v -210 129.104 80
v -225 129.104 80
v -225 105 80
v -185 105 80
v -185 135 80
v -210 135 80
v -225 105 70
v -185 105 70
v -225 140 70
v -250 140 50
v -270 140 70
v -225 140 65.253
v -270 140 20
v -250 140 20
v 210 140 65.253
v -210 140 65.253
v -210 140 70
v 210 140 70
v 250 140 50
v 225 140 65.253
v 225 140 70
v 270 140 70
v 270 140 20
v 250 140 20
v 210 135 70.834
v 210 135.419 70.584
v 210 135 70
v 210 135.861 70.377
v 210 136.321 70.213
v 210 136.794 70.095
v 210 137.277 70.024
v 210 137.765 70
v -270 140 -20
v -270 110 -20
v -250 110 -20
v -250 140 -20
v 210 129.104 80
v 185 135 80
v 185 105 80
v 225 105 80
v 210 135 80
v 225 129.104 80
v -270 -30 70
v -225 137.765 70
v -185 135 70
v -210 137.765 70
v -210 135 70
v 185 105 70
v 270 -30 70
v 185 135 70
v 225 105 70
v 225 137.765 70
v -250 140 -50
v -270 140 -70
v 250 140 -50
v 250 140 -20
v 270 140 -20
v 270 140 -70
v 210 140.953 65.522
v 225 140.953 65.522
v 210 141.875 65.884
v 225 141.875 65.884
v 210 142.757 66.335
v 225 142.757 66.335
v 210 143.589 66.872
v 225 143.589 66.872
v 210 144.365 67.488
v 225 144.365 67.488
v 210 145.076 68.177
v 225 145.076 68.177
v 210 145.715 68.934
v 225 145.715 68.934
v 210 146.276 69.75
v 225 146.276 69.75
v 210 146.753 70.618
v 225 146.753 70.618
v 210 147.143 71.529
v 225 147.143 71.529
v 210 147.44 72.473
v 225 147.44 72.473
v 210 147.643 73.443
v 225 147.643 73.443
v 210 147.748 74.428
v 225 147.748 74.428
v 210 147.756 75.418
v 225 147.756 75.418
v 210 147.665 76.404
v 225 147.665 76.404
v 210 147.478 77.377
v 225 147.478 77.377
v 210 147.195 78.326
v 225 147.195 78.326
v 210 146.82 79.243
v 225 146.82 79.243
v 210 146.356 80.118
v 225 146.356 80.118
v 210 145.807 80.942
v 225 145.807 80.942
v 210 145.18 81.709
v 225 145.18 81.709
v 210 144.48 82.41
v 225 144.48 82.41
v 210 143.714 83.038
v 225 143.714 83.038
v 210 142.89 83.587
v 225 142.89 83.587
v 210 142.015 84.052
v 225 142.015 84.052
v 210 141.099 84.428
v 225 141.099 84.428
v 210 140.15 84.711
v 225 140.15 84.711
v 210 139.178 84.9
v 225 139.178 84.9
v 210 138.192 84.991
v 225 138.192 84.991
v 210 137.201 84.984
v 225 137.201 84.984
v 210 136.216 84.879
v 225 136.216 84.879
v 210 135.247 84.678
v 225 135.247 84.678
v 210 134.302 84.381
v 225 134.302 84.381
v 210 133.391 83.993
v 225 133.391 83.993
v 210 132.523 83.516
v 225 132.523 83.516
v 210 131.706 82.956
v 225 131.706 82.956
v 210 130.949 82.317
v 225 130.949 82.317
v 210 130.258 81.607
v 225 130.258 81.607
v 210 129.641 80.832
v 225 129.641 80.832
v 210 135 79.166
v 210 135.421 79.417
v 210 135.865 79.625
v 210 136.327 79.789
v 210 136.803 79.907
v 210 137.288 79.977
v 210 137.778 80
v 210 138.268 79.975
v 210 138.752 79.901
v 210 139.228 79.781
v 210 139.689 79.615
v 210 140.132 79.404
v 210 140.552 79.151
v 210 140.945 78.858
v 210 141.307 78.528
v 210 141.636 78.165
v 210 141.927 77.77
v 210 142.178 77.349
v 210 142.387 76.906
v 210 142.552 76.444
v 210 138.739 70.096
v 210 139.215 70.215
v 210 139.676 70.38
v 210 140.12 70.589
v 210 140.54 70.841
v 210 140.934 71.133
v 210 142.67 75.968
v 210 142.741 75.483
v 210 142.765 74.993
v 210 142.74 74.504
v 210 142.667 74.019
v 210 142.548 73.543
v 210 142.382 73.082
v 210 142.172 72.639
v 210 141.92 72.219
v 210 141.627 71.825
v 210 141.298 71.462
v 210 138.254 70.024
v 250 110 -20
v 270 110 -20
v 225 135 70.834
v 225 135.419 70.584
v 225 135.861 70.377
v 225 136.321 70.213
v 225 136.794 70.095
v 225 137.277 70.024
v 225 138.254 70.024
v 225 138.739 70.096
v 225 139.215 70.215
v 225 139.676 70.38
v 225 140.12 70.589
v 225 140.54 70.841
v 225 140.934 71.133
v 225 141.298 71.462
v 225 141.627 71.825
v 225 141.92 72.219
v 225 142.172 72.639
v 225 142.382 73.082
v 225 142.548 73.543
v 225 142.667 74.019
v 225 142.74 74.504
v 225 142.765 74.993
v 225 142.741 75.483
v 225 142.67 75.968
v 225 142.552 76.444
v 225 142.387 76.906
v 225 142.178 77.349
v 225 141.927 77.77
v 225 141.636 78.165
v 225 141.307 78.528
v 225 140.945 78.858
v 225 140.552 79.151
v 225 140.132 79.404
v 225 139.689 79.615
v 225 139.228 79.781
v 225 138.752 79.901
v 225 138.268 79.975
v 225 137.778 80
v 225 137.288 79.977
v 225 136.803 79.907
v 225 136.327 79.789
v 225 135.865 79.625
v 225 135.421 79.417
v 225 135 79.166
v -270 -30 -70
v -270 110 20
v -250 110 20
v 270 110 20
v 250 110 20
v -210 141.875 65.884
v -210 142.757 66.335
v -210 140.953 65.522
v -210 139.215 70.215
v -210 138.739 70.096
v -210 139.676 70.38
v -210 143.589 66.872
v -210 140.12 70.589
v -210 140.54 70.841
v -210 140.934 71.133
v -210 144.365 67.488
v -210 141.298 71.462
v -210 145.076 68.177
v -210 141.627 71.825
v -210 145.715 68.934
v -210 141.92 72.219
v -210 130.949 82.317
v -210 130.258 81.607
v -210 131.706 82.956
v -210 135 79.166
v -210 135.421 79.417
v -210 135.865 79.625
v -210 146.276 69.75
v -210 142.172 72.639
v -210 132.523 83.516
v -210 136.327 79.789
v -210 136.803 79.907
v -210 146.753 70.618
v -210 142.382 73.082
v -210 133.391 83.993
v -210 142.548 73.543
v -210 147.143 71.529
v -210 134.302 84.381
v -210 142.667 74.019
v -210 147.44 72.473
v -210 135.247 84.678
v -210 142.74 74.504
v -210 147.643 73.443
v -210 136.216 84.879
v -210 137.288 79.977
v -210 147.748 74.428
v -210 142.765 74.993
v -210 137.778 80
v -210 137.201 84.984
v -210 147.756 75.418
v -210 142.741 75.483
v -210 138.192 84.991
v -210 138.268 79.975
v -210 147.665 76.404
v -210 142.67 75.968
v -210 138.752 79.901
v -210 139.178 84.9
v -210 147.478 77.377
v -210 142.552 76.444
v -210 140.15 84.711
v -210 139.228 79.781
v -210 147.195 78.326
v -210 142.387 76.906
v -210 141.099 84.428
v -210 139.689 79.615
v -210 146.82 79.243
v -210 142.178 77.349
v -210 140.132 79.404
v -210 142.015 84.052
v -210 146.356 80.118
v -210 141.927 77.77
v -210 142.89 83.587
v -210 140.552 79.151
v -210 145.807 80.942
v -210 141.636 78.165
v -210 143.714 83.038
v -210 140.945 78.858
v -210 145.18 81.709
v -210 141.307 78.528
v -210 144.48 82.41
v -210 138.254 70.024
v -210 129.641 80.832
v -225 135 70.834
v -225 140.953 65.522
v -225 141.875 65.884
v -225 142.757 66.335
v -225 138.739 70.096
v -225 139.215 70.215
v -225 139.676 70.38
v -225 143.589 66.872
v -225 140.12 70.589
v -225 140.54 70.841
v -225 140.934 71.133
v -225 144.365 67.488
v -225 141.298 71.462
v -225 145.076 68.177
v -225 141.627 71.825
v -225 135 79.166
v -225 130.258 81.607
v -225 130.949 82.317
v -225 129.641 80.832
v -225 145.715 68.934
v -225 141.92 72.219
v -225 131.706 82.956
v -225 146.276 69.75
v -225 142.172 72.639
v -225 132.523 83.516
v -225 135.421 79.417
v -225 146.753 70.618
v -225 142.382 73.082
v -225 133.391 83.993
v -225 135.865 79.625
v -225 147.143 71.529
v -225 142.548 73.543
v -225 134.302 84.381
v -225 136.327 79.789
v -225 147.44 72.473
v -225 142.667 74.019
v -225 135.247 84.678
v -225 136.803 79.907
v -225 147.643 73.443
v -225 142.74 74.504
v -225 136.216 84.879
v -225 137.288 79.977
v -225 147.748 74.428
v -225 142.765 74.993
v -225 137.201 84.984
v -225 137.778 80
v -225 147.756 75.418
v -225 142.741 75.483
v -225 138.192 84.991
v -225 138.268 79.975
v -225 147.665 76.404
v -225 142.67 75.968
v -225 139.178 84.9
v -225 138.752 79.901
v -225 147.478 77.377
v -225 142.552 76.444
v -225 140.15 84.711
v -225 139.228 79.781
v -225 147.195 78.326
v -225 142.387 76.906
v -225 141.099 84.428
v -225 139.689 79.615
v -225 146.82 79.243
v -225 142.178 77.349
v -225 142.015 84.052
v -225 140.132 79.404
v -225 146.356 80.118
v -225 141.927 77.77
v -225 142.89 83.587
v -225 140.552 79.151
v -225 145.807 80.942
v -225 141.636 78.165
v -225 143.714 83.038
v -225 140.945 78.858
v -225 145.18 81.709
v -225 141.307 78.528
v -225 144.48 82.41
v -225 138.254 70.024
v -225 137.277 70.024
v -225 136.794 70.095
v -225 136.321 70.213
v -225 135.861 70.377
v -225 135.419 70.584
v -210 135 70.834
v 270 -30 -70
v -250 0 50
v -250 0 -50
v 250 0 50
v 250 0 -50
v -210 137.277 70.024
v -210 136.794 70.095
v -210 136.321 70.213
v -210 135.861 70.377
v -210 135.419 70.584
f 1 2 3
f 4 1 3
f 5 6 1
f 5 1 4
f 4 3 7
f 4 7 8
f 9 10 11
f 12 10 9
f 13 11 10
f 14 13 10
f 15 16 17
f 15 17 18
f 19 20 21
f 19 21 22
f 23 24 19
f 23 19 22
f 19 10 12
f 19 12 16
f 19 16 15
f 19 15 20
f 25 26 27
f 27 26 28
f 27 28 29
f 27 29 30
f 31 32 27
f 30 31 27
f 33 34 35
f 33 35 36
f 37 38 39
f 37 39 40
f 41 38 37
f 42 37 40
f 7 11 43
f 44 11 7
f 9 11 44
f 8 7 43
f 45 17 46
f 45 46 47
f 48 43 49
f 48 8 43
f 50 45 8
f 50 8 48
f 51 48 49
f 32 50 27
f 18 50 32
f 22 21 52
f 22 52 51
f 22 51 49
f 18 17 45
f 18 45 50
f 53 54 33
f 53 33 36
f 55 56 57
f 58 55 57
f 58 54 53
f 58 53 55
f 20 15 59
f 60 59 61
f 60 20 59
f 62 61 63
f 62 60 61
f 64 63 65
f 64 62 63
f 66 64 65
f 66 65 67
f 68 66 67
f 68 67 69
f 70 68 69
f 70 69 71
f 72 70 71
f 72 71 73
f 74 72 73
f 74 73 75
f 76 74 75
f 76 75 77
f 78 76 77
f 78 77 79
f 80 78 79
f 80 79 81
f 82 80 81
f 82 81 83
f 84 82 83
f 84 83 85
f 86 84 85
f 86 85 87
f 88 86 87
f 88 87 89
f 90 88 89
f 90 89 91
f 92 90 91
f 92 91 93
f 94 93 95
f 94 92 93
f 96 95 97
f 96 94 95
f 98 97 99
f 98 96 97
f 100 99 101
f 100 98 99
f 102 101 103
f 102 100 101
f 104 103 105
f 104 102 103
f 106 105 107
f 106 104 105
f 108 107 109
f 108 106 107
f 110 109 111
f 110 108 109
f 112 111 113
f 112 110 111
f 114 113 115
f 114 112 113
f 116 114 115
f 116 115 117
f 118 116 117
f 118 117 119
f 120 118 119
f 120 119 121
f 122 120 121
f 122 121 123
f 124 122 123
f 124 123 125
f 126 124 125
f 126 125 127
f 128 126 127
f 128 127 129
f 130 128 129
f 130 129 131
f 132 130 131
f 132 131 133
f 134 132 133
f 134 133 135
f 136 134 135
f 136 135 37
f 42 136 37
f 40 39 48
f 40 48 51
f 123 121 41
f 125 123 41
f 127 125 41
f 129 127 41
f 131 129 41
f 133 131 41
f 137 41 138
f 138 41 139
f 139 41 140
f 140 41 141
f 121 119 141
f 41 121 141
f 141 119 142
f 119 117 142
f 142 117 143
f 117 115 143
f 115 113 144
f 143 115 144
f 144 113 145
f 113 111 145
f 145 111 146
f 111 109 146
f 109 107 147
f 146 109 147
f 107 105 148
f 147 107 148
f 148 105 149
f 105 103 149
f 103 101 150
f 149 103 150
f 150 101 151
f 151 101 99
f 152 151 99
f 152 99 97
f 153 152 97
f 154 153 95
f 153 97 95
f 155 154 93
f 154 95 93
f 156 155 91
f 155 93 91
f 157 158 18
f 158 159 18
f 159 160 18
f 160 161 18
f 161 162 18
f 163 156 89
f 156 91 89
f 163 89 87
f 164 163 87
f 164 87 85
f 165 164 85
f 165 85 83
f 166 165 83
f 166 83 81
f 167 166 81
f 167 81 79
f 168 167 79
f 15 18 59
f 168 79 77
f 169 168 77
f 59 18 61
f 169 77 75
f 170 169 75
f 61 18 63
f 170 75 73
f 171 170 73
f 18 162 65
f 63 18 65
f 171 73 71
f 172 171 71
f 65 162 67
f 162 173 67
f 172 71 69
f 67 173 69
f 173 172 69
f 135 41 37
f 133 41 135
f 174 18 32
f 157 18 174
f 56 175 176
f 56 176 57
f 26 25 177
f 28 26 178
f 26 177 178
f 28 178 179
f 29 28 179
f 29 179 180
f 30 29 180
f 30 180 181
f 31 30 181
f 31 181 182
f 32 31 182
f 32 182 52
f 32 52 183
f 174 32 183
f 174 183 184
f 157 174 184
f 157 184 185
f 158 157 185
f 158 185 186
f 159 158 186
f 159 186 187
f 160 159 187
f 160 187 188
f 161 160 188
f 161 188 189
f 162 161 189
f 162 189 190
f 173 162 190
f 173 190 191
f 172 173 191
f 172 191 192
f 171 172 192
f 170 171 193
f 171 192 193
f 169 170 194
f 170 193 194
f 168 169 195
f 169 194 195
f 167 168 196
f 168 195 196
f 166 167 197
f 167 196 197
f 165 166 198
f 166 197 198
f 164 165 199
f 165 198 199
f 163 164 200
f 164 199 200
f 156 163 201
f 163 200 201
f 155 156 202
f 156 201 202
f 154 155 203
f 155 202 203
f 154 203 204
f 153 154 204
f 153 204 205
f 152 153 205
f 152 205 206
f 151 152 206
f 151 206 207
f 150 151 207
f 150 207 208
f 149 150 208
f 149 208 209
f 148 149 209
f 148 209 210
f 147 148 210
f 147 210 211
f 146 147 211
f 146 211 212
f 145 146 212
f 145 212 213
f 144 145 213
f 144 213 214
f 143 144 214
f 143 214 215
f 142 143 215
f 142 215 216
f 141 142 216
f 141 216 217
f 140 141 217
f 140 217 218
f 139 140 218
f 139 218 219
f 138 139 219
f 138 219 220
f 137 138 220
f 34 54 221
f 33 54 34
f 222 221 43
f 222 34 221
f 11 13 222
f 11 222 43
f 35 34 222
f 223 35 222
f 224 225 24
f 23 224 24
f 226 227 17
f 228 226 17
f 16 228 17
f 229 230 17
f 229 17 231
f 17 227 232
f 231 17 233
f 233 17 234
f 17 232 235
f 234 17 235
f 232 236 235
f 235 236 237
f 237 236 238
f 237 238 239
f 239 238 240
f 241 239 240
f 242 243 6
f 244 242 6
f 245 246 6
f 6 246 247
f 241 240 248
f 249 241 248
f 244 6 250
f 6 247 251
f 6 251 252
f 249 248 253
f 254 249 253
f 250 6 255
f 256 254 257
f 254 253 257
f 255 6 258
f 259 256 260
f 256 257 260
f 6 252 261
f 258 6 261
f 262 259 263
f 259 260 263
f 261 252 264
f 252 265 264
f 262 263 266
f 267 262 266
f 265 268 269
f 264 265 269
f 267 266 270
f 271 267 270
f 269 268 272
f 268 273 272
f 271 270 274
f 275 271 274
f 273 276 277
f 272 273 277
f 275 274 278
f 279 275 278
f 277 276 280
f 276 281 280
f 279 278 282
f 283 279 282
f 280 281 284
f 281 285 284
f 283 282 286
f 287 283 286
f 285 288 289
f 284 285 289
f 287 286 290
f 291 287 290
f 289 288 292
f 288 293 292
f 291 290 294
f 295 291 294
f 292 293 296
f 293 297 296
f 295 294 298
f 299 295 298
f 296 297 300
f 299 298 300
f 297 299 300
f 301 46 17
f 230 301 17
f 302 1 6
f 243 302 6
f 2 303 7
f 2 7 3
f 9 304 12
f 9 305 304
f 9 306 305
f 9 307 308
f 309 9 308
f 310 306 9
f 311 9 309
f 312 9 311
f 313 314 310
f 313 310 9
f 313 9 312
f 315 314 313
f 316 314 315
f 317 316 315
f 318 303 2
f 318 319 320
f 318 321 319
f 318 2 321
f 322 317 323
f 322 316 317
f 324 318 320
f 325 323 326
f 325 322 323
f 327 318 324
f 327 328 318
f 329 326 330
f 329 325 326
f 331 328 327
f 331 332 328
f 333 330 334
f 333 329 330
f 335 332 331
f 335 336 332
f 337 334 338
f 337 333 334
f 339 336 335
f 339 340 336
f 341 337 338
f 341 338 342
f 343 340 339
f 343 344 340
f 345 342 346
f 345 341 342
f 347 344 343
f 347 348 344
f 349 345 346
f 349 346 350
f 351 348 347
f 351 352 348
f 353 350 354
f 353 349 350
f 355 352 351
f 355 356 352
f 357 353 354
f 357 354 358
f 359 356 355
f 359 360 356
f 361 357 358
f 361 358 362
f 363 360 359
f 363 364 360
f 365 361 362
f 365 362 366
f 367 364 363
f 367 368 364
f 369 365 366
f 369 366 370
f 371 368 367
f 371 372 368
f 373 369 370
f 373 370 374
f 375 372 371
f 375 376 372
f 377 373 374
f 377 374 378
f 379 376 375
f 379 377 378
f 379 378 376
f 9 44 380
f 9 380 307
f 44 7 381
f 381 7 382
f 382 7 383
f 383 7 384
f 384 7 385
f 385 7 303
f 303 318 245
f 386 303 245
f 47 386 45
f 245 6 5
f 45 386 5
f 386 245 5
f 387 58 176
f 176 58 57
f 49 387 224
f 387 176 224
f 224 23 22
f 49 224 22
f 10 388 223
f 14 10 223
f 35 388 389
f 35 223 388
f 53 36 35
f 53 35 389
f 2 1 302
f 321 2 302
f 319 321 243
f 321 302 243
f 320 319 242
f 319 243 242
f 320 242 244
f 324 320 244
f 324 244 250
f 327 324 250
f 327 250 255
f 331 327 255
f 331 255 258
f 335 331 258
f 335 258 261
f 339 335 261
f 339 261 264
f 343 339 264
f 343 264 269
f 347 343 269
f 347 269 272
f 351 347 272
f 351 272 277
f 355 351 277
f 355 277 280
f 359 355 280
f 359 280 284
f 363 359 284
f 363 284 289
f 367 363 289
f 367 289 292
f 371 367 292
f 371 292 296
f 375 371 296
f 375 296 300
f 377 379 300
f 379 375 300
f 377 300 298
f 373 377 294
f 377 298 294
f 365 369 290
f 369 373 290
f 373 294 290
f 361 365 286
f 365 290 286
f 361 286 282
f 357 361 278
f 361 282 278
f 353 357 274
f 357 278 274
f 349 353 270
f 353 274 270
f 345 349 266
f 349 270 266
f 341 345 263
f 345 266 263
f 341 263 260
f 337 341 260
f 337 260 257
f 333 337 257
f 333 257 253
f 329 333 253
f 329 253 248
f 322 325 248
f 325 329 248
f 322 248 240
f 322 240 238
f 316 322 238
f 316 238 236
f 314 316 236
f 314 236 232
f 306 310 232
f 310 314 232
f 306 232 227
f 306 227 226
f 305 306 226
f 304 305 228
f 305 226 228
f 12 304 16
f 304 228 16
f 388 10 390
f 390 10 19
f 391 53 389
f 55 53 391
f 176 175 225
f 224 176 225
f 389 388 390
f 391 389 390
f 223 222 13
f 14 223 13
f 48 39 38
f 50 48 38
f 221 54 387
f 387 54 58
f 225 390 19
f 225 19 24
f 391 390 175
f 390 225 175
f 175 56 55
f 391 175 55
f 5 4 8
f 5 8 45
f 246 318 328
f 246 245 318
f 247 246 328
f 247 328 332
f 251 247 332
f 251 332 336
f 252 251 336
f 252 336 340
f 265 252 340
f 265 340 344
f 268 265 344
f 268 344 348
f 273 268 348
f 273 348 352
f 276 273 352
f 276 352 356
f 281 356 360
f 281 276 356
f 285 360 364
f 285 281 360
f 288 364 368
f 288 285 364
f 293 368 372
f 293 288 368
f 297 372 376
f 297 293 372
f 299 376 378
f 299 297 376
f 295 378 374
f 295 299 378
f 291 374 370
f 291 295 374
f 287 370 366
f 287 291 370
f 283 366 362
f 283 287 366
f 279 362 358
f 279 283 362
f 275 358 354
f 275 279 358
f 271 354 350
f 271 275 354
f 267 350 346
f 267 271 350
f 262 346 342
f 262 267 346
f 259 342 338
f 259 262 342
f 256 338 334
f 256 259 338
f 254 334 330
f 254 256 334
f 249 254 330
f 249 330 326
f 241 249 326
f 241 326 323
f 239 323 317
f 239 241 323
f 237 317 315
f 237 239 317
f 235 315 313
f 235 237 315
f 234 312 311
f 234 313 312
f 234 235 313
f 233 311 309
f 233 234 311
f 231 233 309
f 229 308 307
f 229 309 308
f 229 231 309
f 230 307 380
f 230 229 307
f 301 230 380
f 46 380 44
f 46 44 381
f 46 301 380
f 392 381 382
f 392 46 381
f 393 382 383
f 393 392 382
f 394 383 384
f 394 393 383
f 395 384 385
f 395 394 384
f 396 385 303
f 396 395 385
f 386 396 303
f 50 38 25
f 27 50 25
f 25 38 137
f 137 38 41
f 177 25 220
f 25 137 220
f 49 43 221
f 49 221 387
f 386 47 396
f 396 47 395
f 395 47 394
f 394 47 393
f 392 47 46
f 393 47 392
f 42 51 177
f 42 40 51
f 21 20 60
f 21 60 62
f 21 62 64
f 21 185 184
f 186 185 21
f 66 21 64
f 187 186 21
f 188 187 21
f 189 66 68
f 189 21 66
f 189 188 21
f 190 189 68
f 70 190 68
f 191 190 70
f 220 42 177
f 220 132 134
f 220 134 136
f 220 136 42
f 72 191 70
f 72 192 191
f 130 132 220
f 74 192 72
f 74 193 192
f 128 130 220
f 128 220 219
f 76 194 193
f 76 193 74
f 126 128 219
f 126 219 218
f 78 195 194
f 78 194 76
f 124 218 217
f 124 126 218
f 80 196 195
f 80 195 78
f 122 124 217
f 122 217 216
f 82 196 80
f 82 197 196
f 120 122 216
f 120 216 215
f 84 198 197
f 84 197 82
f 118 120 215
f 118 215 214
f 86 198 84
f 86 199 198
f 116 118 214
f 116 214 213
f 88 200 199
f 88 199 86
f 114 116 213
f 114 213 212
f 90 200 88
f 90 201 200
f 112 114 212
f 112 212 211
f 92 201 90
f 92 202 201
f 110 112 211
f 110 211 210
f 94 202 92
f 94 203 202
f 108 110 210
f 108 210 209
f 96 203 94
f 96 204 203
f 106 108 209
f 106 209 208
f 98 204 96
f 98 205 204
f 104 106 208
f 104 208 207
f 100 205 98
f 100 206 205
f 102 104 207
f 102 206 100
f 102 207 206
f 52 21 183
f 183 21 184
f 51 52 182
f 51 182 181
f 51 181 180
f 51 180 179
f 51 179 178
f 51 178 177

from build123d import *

# Parameters (mm, degrees)
SKETCH_1_W          = 540
SKETCH_1_H          = 140
EXTRUDE_1_DEPTH     = 140
SKETCH_2_W          = 500
SKETCH_2_H          = 100
CUT_EXTRUDE_1_DEPTH = 150
SKETCH_4_W          = 40
SKETCH_4_H          = 30
EXTRUDE_2_DEPTH     = 30
SKETCH_5_W          = 40
SKETCH_5_H          = 30
EXTRUDE_3_DEPTH     = 30
SKETCH_7_R          = 10
SKETCH_7_R_2        = 5
EXTRUDE_1_2_DEPTH   = 15
EXTRUDE_START       = -15
SKETCH_9_R          = 10
SKETCH_9_R_2        = 5
EXTRUDE_2_2_DEPTH   = 15
SKETCH_11_W         = 40
SKETCH_11_H         = 30
CUT_EXTRUDE_3_DEPTH = 567.267937246
SKETCH_13_W         = 540
SKETCH_13_H         = 140
EXTRUDE_6_DEPTH     = 30


with BuildPart() as part:
    # 草圖1 → Extrude 1 (new body)
    with BuildSketch(Plane(origin=(0, 0, 0), x_dir=(1, 0, 0), z_dir=(0, 1, 0))):
        Rectangle(SKETCH_1_W, SKETCH_1_H)
    extrude(amount=EXTRUDE_1_DEPTH)

    # 草圖2 → 除料-伸長1 (cut)
    with BuildSketch(Plane(origin=(0, 140, 0), x_dir=(1, 0, 0), z_dir=(0, 1, 0))):
        Rectangle(SKETCH_2_W, SKETCH_2_H)
    extrude(amount=-CUT_EXTRUDE_1_DEPTH, mode=Mode.SUBTRACT)

    # 草圖4 → Extrude 2 (add)
    with BuildSketch(Plane.XY.offset(80)):
        with Locations((-205, 120)):
            Rectangle(SKETCH_4_W, SKETCH_4_H)
    extrude(amount=-EXTRUDE_2_DEPTH)

    # 草圖5 → 填料-伸長3 (add)
    with BuildSketch(Plane.XY.offset(80)):
        with Locations((205, 120)):
            Rectangle(SKETCH_5_W, SKETCH_5_H)
    extrude(amount=-EXTRUDE_3_DEPTH)

    # 草圖7 → Extrude 1 2 (add)
    with BuildSketch(Plane(origin=(225, 0, 0), x_dir=(0, 0, -1), z_dir=(1, 0, 0))):
        with Locations((-75, 137.764599119)):
            Circle(SKETCH_7_R)
        with Locations((-75, 137.764599119)):
            Circle(SKETCH_7_R_2, mode=Mode.SUBTRACT)
    extrude(amount=-EXTRUDE_1_2_DEPTH)

    # 草圖9 → Extrude 2 2 (add)
    with BuildSketch(Plane.ZY.offset(225).offset(EXTRUDE_START)):
        with Locations((75, 137.764599119)):
            Circle(SKETCH_9_R)
        with Locations((75, 137.764599119)):
            Circle(SKETCH_9_R_2, mode=Mode.SUBTRACT)
    extrude(amount=EXTRUDE_2_2_DEPTH)

    # 草圖11 → 除料-伸長3 (cut, through all)
    with BuildSketch(Plane.ZY.offset(270)):
        with Locations((0, 125)):
            Rectangle(SKETCH_11_W, SKETCH_11_H)
    extrude(amount=-CUT_EXTRUDE_3_DEPTH, mode=Mode.SUBTRACT)

    # 草圖13 → 填料-伸長6 (add)
    with BuildSketch(Plane.XZ):
        Rectangle(SKETCH_13_W, SKETCH_13_H)
    extrude(amount=EXTRUDE_6_DEPTH)


solid = part.part
